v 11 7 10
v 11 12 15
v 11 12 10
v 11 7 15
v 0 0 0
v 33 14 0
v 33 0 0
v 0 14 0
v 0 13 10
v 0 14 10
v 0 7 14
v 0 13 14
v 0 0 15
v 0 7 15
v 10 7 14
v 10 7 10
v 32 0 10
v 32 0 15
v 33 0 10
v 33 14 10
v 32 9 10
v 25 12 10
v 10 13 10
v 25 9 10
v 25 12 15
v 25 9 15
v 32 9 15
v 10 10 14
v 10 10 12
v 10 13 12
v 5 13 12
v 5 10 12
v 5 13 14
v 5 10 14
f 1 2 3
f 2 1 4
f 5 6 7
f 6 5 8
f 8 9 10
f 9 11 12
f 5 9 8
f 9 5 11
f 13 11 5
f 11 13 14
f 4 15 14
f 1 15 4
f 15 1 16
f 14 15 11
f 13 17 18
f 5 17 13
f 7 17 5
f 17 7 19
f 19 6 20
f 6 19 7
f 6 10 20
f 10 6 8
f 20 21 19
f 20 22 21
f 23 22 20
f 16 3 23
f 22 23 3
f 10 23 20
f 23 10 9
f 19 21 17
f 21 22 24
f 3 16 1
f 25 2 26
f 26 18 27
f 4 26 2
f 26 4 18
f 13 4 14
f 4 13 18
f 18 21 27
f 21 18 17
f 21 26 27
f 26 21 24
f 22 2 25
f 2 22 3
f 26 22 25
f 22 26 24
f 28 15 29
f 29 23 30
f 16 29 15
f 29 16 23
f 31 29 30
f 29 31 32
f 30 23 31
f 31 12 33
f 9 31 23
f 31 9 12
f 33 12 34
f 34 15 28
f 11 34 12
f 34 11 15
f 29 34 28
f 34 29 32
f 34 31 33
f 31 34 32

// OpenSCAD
translate([5.5, 3.5, 2.5]) color([0.3151573145870893, 0.7470721078045024, 0.24960896628473228]) cube([11, 7, 5], center=true);
translate([16.5, 3.5, 2.5]) color([0.8629627260654799, 0.6684326881602258, 0.6597695027130189]) cube([11, 7, 5], center=true);
translate([27.5, 3.5, 2.5]) color([0.22591717735012307, 0.3441717078654829, 0.16233220178561225]) cube([11, 7, 5], center=true);
translate([5.5, 10.5, 2.5]) color([0.01697652307419406, 0.5735931064152219, 0.05818297514553228]) cube([11, 7, 5], center=true);
translate([16.5, 10.5, 2.5]) color([0.6304378073753134, 0.35341956482818127, 0.49110709598533775]) cube([11, 7, 5], center=true);
translate([27.5, 10.5, 2.5]) color([0.06132304686728618, 0.24146702174069912, 0.012441234482642782]) cube([11, 7, 5], center=true);
translate([5.5, 3.5, 7.5]) color([0.9455344576677447, 0.3266678829978785, 0.820956849026723]) cube([11, 7, 5], center=true);
translate([16.5, 3.5, 7.5]) color([0.34492851027915805, 0.6639756368298299, 0.13585073420724958]) cube([11, 7, 5], center=true);
translate([27.5, 3.5, 7.5]) color([0.9219835342207869, 0.44896684911260887, 0.1420549627992148]) cube([11, 7, 5], center=true);
translate([5.5, 10.5, 7.5]) color([0.3119518323014343, 0.6490756968320398, 0.7280642389267371]) cube([11, 7, 5], center=true);
translate([16.5, 10.5, 7.5]) color([0.7852833252199665, 0.40863068686923587, 0.009633238682779877]) cube([11, 7, 5], center=true);
translate([27.5, 10.5, 7.5]) color([0.8909238596539266, 0.533705581213062, 0.8046005274030336]) cube([11, 7, 5], center=true);
translate([5.5, 3.5, 12.5]) color([0.9806276909012095, 0.7049346898693578, 0.7590860206033218]) cube([11, 7, 5], center=true);
translate([14.5, 1.5, 12.5]) color([0.5647284680717275, 0.12259546226958773, 0.9539533584587191]) cube([7, 3, 5], center=true);
translate([21.5, 1.5, 12.5]) color([0.1713156178825357, 0.5005542720722199, 0.621843985236089]) cube([7, 3, 5], center=true);
translate([28.5, 1.5, 12.5]) color([0.6619765424276485, 0.8400519693824264, 0.699601591737329]) cube([7, 3, 5], center=true);
translate([14.5, 4.5, 12.5]) color([0.07964741684534404, 0.23738047361475634, 0.8282556520451495]) cube([7, 3, 5], center=true);
translate([21.5, 4.5, 12.5]) color([0.1762738246231843, 0.9459581227747745, 0.9565644324307663]) cube([7, 3, 5], center=true);
translate([28.5, 4.5, 12.5]) color([0.8963269305888116, 0.7428117304122551, 0.8383436924491765]) cube([7, 3, 5], center=true);
translate([14.5, 7.5, 12.5]) color([0.5614087817692366, 0.7177928021437573, 0.4271772721979724]) cube([7, 3, 5], center=true);
translate([21.5, 7.5, 12.5]) color([0.8646648421725511, 0.10365846470378459, 0.6285317276232824]) cube([7, 3, 5], center=true);
translate([28.5, 7.5, 12.5]) color([0.7101075213407797, 0.6149371087697887, 0.0400488022899097]) cube([7, 3, 5], center=true);
translate([14.5, 10.5, 12.5]) color([0.34025031183581533, 0.7380159626358669, 0.3765176313166855]) cube([7, 3, 5], center=true);
translate([21.5, 10.5, 12.5]) color([0.6257641682954356, 0.8894786539399329, 0.4963449395419606]) cube([7, 3, 5], center=true);
translate([2.5, 8.5, 11.0]) color([0.3583651728386771, 0.6716454412848432, 0.45811681625355094]) cube([5, 3, 2], center=true);
translate([7.5, 8.5, 11.0]) color([0.5074379917667022, 0.16228475224599026, 0.7529781863444399]) cube([5, 3, 2], center=true);
translate([2.5, 11.5, 11.0]) color([0.3376457636791449, 0.8033239356600728, 0.9444207727357242]) cube([5, 3, 2], center=true);
translate([7.5, 11.5, 11.0]) color([0.014783921172948133, 0.5303420268039528, 0.2882277186993394]) cube([5, 3, 2], center=true);
translate([2.5, 8.5, 13.0]) color([0.4689175335863792, 0.03492832759702502, 0.5317931441254861]) cube([5, 3, 2], center=true);
translate([7.5, 8.5, 13.0]) color([0.552095437515129, 0.9340898594770107, 0.03830085289416996]) cube([5, 3, 2], center=true);
translate([2.5, 11.5, 13.0]) color([0.3950652682884612, 0.1200155720396251, 0.34658884626630715]) cube([5, 3, 2], center=true);
